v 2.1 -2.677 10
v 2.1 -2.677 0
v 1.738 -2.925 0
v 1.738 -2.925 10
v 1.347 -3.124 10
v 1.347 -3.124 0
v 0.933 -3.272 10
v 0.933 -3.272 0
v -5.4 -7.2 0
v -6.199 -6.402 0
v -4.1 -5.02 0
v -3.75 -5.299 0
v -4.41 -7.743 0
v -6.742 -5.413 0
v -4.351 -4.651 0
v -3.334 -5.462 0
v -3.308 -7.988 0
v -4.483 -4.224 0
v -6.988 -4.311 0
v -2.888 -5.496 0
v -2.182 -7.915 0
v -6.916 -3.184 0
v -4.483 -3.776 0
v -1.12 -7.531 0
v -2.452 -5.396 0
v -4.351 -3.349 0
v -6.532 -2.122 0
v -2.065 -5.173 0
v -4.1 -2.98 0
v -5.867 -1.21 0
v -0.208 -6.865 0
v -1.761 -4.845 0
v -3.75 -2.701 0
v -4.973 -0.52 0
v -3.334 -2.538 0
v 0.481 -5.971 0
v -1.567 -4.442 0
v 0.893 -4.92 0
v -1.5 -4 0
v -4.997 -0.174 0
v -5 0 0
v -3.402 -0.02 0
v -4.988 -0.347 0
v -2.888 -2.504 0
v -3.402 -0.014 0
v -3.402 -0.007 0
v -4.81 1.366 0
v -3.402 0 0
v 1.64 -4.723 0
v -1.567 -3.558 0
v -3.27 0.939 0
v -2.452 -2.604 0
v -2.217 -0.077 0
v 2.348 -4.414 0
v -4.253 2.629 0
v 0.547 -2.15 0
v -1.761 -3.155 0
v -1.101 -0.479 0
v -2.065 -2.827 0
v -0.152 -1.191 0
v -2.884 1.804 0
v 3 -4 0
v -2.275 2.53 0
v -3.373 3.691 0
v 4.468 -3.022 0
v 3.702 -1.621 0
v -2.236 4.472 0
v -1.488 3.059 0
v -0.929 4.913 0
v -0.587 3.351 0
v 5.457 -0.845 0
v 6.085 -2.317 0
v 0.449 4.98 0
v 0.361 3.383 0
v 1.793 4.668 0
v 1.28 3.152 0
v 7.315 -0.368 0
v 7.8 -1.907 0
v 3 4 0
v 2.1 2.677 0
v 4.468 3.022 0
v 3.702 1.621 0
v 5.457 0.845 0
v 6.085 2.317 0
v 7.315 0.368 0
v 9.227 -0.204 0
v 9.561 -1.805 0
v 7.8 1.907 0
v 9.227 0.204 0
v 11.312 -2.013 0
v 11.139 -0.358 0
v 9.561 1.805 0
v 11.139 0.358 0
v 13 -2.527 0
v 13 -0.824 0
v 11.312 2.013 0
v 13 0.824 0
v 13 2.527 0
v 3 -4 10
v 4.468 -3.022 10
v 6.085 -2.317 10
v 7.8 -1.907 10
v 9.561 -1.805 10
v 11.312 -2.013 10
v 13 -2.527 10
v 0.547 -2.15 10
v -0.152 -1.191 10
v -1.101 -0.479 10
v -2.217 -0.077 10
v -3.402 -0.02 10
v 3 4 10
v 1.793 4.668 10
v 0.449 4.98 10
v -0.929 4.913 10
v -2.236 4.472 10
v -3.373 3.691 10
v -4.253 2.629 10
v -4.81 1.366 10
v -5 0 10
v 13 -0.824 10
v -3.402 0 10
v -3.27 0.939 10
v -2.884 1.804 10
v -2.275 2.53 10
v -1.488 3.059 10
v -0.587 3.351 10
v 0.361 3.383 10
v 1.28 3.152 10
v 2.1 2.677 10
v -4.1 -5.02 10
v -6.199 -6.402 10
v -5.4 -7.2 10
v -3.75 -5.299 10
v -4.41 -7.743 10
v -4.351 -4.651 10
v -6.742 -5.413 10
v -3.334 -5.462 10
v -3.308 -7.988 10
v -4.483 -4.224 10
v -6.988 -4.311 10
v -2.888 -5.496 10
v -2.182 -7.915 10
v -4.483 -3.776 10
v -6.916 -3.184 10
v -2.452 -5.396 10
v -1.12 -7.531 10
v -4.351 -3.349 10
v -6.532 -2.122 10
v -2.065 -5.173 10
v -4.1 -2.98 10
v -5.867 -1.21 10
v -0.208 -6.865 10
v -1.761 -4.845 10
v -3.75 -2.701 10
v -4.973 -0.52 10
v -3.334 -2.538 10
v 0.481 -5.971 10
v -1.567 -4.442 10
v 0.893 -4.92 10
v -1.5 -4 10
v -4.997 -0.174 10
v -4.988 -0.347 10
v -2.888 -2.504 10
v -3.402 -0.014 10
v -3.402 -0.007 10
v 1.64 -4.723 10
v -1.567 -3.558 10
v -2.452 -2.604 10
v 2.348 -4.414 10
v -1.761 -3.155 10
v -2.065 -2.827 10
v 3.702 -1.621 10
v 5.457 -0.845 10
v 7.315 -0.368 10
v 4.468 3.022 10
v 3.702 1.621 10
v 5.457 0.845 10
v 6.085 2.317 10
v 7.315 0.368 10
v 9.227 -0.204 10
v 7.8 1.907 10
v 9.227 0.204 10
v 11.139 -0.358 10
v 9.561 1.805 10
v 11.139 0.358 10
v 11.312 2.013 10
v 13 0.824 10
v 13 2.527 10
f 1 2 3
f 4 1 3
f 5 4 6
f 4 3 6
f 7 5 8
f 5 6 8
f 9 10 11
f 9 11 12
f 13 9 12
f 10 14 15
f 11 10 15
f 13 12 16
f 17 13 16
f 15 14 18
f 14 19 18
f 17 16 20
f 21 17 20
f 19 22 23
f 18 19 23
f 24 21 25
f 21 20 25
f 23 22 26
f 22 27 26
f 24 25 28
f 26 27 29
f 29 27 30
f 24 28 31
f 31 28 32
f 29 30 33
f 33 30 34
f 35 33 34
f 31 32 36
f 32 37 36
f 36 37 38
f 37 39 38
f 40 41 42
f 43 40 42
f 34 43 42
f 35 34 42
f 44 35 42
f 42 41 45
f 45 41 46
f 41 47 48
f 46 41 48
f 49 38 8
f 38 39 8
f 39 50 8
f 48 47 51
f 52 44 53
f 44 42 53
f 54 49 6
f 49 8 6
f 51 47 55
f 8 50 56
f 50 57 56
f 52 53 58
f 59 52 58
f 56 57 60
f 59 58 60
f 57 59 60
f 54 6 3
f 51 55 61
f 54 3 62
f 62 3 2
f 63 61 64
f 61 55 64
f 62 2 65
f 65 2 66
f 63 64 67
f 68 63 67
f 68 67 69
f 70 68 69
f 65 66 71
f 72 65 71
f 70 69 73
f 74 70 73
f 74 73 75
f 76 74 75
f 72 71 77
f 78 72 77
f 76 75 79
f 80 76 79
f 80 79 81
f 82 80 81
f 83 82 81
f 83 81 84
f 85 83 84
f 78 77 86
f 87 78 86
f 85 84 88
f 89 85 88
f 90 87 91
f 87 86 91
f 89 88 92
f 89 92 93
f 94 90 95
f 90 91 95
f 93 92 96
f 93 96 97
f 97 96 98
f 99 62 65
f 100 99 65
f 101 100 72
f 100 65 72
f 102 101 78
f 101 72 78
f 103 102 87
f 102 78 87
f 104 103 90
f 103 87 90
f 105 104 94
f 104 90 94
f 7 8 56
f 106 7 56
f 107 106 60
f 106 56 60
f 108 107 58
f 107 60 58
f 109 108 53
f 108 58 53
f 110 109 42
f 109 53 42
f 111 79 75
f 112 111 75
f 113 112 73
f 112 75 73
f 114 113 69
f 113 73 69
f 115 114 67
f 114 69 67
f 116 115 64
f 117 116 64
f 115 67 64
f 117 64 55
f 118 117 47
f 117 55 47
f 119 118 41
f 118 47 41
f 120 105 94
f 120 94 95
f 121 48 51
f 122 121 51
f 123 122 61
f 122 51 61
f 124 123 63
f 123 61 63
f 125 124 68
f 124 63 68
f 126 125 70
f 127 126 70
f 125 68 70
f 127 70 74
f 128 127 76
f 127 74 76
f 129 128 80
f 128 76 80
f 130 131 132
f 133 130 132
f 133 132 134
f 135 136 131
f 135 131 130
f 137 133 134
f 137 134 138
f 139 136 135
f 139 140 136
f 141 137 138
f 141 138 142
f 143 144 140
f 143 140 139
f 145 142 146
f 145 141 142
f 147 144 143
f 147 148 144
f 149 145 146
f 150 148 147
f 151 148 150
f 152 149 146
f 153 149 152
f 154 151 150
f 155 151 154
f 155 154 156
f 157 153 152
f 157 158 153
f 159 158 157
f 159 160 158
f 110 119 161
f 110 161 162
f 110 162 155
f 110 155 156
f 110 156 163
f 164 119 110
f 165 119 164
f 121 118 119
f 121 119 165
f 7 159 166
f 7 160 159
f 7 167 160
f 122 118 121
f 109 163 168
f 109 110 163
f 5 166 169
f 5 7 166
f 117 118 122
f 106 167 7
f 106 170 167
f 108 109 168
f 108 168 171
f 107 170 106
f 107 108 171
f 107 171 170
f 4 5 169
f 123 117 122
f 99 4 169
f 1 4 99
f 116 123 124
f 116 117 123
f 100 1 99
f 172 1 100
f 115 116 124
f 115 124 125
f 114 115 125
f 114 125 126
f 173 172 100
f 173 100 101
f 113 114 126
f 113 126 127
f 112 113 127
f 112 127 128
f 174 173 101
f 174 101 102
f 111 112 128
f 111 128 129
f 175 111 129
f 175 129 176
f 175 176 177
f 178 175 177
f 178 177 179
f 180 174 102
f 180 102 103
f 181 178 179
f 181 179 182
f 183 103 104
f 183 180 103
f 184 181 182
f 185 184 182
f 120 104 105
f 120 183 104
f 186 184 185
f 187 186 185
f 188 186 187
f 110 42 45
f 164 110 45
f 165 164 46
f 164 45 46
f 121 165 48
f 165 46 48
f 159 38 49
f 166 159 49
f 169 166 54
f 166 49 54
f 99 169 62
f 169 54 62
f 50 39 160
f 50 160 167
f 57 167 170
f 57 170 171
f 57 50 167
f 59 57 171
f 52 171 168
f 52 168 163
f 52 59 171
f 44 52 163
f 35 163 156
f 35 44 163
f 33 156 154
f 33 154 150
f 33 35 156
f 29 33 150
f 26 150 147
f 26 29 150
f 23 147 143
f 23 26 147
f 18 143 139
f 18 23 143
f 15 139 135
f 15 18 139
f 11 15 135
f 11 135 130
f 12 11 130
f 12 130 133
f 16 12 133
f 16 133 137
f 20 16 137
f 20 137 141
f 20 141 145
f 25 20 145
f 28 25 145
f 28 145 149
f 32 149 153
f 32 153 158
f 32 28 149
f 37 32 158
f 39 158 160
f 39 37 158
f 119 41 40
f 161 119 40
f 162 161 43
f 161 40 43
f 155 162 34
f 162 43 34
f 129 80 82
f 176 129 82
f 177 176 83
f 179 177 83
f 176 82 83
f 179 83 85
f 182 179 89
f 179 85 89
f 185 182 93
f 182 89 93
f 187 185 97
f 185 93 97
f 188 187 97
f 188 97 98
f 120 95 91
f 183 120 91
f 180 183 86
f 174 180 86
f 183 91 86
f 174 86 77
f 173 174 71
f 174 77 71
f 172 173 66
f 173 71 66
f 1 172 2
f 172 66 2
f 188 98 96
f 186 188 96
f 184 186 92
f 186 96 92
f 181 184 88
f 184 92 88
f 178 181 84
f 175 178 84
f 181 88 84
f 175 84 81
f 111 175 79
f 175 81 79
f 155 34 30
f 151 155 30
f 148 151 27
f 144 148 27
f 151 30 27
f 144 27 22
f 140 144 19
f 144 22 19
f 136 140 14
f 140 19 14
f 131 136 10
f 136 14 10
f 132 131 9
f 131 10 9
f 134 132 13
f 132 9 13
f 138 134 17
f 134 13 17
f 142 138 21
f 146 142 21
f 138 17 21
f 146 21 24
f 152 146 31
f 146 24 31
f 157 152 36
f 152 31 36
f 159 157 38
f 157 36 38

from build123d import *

# Parameters (mm, degrees)
F0_R     = 1.5
F1_DEPTH = 10


with BuildPart() as f1:
    # F0 (on Top) → F1 (new body)
    with BuildSketch(Plane.XY):
        with BuildLine():
            ThreePointArc((13, 2.526602), (7.800135, 1.906809), (3, 4))
            ThreePointArc((3, 4), (-2.236068, 4.472136), (-5, 0))
            ThreePointArc((-5, 0), (-4.993207, -0.260536), (-4.972848, -0.520364))
            ThreePointArc((-4.972848, -0.520364), (-5.4, -7.2), (0.892848, -4.919636))
            ThreePointArc((0.892848, -4.919636), (2, -4.582576), (3, -4))
            ThreePointArc((3, -4), (7.800135, -1.906809), (13, -2.526602))
            Line((13, -2.526602), (13, -0.824336))
            ThreePointArc((13, -0.824336), (7.315028, -0.36781), (2.1, -2.676663))
            ThreePointArc((2.1, -2.676663), (1.545471, -3.030849), (0.933132, -3.271665))
            ThreePointArc((0.933132, -3.271665), (-0.6, -0.8), (-3.402075, -0.020259))
            ThreePointArc((-3.402075, -0.020259), (-3.40212, -0.01013), (-3.402136, 0))
            ThreePointArc((-3.402136, 0), (-1.488295, 3.059331), (2.1, 2.676663))
            ThreePointArc((2.1, 2.676663), (7.315028, 0.36781), (13, 0.824336))
            Line((13, 0.824336), (13, 2.526602))
        make_face()
        with Locations((-3, -4)):
            Circle(F0_R, mode=Mode.SUBTRACT)
    extrude(amount=F1_DEPTH)


solid = f1.part
